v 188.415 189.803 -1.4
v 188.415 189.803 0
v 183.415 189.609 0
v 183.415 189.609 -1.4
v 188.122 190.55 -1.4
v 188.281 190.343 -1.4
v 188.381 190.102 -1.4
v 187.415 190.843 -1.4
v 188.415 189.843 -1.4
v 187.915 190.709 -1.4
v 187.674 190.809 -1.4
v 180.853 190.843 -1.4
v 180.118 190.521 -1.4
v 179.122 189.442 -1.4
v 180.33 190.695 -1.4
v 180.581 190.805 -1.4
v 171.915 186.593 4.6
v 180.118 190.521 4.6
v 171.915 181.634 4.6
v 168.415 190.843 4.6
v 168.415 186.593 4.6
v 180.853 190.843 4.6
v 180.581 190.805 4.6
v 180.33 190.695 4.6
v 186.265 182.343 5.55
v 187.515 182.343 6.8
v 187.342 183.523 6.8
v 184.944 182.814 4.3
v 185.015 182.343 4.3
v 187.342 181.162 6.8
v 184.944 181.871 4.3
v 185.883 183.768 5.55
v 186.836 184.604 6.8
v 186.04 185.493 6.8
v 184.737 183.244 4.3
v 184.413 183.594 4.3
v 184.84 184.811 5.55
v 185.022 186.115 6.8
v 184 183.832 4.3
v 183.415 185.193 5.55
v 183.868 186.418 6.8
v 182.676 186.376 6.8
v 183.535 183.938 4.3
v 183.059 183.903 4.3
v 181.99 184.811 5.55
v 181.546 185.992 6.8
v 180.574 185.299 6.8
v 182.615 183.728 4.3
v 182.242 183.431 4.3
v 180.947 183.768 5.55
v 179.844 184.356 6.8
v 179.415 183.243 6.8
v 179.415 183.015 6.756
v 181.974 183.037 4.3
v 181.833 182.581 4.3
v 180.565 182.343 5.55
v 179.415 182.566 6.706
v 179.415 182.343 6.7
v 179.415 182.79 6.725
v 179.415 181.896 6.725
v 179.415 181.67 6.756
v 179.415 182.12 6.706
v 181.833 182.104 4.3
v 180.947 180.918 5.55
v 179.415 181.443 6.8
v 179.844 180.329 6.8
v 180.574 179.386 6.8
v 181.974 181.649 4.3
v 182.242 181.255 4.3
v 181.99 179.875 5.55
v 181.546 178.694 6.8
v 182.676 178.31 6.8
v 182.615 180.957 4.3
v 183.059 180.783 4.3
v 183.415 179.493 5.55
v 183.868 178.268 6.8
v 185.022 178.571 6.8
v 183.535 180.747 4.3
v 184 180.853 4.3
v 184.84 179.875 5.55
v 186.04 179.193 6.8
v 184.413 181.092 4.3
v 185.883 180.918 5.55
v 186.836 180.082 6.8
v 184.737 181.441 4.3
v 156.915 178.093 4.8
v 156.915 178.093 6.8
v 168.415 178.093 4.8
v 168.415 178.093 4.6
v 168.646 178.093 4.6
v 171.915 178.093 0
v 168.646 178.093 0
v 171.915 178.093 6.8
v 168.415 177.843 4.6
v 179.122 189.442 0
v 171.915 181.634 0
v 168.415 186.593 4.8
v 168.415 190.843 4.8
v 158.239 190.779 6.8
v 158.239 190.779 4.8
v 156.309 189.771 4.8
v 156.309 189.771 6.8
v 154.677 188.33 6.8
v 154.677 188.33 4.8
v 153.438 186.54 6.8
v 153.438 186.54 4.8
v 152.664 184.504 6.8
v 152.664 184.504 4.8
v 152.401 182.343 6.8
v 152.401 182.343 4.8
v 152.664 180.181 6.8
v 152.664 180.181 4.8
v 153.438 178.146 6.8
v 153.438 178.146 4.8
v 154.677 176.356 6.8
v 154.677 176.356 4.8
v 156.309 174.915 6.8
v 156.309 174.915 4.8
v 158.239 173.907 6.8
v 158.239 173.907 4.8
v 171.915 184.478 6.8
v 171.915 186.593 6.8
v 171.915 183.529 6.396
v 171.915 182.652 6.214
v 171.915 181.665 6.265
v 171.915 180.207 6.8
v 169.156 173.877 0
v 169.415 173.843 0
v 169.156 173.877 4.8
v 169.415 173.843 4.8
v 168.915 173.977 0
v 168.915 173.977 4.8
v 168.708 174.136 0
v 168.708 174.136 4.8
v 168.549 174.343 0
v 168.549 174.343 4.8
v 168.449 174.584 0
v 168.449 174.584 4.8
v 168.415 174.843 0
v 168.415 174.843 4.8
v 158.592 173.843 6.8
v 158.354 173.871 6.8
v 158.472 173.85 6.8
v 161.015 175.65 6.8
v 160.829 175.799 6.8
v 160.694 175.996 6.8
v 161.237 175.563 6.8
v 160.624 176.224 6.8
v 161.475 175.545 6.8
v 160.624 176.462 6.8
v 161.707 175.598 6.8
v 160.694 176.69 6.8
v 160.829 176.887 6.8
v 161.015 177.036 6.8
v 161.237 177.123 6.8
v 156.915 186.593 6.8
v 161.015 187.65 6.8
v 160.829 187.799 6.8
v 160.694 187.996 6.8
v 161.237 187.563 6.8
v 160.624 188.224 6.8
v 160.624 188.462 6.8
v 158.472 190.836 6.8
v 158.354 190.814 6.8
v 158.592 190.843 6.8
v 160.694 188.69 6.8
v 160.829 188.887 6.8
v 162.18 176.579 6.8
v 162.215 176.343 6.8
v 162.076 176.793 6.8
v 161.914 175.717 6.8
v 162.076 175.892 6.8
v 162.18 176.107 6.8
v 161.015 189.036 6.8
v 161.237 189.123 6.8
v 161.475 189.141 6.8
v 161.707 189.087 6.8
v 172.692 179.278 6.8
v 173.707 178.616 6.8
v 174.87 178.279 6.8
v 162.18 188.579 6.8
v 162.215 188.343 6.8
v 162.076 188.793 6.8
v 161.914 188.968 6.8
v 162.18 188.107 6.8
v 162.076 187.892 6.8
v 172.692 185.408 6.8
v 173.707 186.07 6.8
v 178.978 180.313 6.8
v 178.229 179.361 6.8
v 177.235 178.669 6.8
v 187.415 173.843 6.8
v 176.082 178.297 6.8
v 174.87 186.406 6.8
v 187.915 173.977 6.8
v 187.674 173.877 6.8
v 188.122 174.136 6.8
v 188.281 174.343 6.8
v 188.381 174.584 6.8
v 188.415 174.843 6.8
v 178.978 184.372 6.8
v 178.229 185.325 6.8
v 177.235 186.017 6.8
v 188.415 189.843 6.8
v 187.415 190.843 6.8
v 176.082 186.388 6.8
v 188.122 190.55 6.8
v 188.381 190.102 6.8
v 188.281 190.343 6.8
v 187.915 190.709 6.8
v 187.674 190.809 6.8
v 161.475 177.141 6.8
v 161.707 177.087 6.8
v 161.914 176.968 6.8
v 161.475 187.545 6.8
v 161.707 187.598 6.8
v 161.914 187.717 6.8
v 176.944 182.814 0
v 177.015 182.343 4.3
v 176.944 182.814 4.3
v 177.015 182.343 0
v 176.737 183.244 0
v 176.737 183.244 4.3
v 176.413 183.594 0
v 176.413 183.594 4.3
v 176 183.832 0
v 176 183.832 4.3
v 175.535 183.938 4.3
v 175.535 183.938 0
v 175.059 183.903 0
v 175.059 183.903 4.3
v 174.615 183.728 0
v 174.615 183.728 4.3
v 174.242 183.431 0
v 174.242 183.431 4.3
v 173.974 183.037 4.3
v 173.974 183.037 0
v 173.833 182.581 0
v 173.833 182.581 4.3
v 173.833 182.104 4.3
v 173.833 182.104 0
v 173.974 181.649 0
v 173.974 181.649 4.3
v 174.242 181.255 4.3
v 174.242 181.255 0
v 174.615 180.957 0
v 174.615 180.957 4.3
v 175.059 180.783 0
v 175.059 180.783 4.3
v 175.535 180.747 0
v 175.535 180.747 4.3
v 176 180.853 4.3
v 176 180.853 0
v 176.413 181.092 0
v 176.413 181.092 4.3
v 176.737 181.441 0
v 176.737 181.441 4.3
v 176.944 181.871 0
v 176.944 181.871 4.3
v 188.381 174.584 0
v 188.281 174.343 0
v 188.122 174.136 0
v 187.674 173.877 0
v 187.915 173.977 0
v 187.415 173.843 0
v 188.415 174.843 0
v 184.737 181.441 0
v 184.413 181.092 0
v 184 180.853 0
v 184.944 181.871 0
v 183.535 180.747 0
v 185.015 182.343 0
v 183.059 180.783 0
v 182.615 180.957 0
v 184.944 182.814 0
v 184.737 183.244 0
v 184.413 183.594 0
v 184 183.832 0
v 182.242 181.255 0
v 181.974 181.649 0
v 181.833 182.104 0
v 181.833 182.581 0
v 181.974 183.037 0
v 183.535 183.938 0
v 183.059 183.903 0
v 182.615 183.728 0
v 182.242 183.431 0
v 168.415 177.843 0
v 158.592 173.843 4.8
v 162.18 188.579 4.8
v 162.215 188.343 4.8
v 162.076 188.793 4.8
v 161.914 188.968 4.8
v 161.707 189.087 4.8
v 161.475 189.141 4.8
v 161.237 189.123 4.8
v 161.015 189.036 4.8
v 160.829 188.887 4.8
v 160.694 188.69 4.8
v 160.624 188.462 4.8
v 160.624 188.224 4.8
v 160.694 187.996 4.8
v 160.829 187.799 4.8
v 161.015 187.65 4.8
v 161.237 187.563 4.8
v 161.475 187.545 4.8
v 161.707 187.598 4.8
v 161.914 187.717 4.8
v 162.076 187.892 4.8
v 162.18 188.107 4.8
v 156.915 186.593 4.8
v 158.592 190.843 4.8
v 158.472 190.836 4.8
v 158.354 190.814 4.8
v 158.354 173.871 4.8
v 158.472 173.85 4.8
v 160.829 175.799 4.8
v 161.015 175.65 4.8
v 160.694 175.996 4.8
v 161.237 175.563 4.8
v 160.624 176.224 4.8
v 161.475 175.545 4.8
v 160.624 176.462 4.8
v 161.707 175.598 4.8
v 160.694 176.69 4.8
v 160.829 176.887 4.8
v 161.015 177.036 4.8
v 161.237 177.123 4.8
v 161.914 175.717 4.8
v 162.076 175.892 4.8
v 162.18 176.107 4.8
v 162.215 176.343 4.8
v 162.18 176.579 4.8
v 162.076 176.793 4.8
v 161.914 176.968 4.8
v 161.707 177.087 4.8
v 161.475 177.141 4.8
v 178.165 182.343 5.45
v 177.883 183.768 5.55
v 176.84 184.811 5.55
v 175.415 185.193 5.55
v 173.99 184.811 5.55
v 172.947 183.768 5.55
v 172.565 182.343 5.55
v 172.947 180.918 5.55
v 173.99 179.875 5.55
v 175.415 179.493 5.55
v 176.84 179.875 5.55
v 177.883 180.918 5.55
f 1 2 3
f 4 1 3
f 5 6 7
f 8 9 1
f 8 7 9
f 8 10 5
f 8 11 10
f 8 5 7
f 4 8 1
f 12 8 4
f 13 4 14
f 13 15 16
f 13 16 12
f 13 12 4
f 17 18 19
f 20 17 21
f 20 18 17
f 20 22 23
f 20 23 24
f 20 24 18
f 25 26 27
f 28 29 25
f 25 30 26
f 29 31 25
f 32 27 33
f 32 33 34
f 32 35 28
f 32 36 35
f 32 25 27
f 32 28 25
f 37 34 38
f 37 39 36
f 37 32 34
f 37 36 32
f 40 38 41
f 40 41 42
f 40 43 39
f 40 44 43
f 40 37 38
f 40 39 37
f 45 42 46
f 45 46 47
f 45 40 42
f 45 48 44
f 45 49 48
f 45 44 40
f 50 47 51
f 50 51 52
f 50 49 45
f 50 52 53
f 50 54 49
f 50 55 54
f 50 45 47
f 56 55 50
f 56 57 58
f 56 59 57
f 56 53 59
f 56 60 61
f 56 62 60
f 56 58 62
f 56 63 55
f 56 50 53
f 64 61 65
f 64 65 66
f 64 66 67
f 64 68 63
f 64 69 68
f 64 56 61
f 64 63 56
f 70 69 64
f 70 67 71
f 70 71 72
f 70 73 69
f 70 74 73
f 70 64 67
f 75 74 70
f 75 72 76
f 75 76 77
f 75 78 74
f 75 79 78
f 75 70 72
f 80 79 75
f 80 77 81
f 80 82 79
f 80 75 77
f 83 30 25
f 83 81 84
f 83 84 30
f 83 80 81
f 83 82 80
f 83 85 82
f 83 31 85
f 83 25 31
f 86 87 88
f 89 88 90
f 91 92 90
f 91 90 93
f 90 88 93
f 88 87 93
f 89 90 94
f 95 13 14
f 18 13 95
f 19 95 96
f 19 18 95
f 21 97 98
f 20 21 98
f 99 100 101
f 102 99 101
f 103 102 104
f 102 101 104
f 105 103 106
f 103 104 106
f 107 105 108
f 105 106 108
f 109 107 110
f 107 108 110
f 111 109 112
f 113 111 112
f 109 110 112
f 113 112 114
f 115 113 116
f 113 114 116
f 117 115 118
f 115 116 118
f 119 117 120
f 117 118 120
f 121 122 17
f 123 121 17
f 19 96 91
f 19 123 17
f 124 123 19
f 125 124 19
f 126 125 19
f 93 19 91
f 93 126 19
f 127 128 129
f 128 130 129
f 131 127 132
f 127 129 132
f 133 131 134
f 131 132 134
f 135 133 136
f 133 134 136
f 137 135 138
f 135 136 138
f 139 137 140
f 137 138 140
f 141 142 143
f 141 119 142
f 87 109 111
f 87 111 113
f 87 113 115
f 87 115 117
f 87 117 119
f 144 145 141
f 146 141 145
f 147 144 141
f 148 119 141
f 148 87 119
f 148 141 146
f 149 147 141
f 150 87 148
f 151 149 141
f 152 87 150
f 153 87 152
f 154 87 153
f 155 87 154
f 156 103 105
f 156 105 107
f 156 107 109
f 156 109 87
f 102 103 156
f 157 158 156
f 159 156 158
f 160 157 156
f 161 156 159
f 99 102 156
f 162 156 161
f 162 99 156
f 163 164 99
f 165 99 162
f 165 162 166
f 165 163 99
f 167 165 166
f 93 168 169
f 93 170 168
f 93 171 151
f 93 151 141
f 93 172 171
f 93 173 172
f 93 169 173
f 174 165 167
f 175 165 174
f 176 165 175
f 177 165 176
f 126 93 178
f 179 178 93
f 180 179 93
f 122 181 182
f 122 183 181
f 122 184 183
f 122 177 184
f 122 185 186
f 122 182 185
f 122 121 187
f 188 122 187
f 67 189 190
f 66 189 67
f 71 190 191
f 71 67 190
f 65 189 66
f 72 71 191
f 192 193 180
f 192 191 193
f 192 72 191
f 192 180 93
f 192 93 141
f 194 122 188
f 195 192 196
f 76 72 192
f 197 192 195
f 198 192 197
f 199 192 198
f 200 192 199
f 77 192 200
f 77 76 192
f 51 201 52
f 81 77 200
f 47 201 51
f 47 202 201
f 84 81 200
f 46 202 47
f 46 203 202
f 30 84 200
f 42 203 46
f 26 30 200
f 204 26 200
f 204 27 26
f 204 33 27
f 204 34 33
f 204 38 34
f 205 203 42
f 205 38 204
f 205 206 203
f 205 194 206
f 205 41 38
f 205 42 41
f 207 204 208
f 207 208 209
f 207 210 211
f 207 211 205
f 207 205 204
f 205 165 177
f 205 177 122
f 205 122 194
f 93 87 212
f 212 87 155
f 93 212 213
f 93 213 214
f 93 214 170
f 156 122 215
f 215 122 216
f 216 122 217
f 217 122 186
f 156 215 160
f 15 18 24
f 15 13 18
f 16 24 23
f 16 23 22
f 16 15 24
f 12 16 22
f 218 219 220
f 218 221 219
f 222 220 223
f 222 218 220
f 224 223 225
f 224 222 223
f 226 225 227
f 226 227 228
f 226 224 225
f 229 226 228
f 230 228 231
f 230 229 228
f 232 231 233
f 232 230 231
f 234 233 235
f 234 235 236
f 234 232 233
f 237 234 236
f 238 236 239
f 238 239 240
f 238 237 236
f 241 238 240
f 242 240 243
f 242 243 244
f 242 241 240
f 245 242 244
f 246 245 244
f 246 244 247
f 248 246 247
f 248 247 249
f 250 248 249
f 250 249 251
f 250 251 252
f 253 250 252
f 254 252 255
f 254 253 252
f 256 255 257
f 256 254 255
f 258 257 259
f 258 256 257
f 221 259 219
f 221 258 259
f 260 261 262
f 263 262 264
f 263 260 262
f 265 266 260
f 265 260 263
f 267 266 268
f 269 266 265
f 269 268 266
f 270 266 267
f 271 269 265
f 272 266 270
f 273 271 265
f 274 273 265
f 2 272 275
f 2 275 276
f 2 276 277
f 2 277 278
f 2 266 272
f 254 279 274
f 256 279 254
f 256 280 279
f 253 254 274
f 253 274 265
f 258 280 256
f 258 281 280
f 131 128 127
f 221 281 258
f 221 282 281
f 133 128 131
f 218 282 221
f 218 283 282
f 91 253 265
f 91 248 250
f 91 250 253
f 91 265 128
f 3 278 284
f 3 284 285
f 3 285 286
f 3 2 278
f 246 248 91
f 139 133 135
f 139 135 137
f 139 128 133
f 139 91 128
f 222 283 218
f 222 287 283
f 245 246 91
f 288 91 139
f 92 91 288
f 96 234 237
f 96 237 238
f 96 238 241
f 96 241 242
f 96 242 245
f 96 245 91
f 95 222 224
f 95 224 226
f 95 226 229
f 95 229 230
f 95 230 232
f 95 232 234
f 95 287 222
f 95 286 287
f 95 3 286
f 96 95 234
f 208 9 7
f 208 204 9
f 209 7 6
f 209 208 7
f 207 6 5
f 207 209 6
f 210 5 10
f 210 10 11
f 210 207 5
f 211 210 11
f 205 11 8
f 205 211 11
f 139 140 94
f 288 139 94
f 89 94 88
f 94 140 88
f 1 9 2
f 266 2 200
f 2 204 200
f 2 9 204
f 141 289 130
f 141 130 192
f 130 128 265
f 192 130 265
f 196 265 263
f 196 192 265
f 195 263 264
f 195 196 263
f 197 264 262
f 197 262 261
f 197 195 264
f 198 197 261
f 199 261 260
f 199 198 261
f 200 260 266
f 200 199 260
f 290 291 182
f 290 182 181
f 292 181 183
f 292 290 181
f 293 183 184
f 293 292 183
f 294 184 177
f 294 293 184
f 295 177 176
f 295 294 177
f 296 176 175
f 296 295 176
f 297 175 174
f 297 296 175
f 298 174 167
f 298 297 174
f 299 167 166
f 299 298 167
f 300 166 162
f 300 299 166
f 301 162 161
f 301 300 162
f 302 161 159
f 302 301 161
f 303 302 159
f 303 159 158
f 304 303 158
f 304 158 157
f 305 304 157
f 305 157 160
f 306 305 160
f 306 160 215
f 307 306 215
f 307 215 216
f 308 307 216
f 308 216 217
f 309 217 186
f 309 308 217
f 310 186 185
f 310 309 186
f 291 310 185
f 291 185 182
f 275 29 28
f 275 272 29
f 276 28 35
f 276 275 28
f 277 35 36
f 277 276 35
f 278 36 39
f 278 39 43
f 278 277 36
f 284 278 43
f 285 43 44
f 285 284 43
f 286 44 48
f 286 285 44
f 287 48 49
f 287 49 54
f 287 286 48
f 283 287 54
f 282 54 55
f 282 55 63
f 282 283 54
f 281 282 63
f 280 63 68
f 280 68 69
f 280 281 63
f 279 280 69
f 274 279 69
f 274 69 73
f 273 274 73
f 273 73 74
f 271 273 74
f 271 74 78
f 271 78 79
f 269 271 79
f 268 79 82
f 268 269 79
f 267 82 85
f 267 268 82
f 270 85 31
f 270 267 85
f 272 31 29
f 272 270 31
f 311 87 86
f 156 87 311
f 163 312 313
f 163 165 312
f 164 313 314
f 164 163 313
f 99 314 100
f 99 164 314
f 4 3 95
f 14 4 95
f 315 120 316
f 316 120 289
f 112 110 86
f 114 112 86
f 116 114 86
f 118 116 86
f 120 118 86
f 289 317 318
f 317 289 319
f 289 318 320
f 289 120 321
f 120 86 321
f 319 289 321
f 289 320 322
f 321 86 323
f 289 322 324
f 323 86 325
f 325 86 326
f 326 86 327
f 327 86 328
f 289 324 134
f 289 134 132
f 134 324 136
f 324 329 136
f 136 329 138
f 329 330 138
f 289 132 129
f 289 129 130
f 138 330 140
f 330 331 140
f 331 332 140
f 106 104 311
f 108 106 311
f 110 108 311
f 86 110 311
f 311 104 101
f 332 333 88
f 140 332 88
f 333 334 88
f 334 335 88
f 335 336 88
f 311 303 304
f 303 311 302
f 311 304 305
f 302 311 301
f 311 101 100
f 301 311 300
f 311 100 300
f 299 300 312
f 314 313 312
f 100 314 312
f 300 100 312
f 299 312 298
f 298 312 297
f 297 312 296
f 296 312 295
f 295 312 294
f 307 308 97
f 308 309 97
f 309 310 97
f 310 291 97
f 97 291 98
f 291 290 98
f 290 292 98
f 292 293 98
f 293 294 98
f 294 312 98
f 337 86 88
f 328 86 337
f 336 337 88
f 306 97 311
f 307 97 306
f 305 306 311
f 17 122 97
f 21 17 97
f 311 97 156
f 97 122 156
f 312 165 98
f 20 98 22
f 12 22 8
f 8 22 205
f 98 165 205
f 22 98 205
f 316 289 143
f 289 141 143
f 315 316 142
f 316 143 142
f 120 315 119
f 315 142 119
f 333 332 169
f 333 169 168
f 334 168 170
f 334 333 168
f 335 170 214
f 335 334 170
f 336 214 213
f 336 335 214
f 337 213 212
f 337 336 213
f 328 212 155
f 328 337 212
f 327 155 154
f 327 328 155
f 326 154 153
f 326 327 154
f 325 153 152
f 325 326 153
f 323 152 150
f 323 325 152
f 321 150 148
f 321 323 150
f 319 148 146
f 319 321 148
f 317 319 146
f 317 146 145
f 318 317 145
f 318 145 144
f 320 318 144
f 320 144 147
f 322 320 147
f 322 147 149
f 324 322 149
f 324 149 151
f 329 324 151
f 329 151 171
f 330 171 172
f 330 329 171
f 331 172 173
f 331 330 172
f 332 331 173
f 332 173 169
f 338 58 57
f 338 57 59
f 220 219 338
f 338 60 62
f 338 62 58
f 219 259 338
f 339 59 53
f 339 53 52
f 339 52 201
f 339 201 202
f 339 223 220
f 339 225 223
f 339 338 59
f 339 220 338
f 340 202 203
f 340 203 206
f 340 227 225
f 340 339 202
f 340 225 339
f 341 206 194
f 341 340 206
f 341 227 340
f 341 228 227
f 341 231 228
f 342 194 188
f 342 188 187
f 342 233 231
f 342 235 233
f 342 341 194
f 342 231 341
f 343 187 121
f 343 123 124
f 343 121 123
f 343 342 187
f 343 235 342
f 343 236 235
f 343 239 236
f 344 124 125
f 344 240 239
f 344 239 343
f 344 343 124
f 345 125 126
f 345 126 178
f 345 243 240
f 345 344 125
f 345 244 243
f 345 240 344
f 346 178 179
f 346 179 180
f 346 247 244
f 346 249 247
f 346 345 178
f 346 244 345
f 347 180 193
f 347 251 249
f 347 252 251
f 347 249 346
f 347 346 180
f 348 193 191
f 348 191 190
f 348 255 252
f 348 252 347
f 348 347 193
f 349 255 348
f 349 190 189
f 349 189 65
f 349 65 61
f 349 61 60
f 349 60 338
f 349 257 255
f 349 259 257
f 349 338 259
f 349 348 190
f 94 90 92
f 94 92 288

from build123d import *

# Parameters (mm, degrees)
SKETCH4_R               = 1.6
BOSS_EXTRUDE1_DEPTH     = 4.8
SKETCH5_R               = 1.6
SKETCH5_R_2             = 0.8
BOSS_EXTRUDE3_DEPTH     = 2
BOSS_EXTRUDE4_DEPTH     = 1.4
CUT_EXTRUDE1_DEPTH      = 1.4
CUT_EXTRUDE1_DEPTH_BACK = 4.6
CHAMFER1_SIZE           = 2.5
FILLET1_R               = 1
CUT_EXTRUDE2_DEPTH      = 10


with BuildPart() as part:
    # Sketch4 → Boss-Extrude1 (new body)
    with BuildSketch(Plane.XY):
        Polygon((183.415148292, 173.842793615), (168.415148292, 173.842793615), (168.415148292, 190.842793615), (183.415148292, 190.842793615), (188.415148292, 190.842793615), (188.415148292, 173.842793615), align=None)
        with Locations((175.415148292, 182.342793615)):
            Circle(SKETCH4_R, mode=Mode.SUBTRACT)
        with Locations((183.415148292, 182.342793615)):
            Circle(SKETCH4_R, mode=Mode.SUBTRACT)
    extrude(amount=BOSS_EXTRUDE1_DEPTH)

    # Sketch5 → Boss-Extrude3 (add)
    with BuildSketch(Plane.XY.offset(4.8)):
        with BuildLine():
            ThreePointArc((158.415148292, 190.842793615), (152.401270103, 182.342793615), (158.415148292, 173.842793615))
            Line((158.415148292, 173.842793615), (188.415148292, 173.842793615))
            Line((188.415148292, 173.842793615), (188.415148292, 190.842793615))
            Line((188.415148292, 190.842793615), (158.415148292, 190.842793615))
        make_face()
        with Locations((175.415148292, 182.342793615)):
            Circle(SKETCH5_R, mode=Mode.SUBTRACT)
        with Locations((183.415148292, 182.342793615)):
            Circle(SKETCH5_R, mode=Mode.SUBTRACT)
        with Locations((161.415148292, 176.342793615)):
            Circle(SKETCH5_R_2, mode=Mode.SUBTRACT)
        with Locations((161.415148292, 188.342793615)):
            Circle(SKETCH5_R_2, mode=Mode.SUBTRACT)
    extrude(amount=BOSS_EXTRUDE3_DEPTH)

    # Sketch6 → Boss-Extrude4 (add)
    with BuildSketch(Plane(origin=(0, 0, 0), x_dir=(-1, 0, 0), z_dir=(0, 0, -1))):
        Polygon((-183.415148292, 189.608806881), (-168.415148292, 189.02555036), (-168.415148292, 190.842793615), (-183.415148292, 190.842793615), (-188.415148292, 190.842793615), (-188.415148292, 189.803225722), align=None)
    extrude(amount=BOSS_EXTRUDE4_DEPTH)

    # Sketch8 → Cut-Extrude1 (cut, two sides: drawn at the far end of the back side and taken through both)
    with BuildSketch(Plane(origin=(0, 0, 0), x_dir=(-1, 0, 0), z_dir=(0, 0, -1)).offset(-CUT_EXTRUDE1_DEPTH_BACK)):
        Polygon((-180.415148292, 190.842793615), (-168.415148292, 177.842793615), (-168.415148292, 190.842793615), align=None)
    extrude(amount=CUT_EXTRUDE1_DEPTH + CUT_EXTRUDE1_DEPTH_BACK, mode=Mode.SUBTRACT)

    # Chamfer1
    # the kernel refuses this chamfer: 2.5 mm, written as the material it takes off along each edge
    with BuildSketch(Plane(origin=(175.415148292, 182.342793615, 6.8), x_dir=(1, 0, 0), z_dir=(0, -1, 0))) as chamfer1_piece_1:
        Polygon((1.6 + CHAMFER1_SIZE, 0), (1.6, -CHAMFER1_SIZE), (1.6, 0), align=None)
    revolve(axis=Axis((175.415148292, 182.342793615, 6.8), (0, 0, 1)), mode=Mode.SUBTRACT)
    with BuildSketch(Plane(origin=(183.415148292, 182.342793615, 6.8), x_dir=(1, 0, 0), z_dir=(0, -1, 0))) as chamfer1_piece_2:
        Polygon((1.6 + CHAMFER1_SIZE, 0), (1.6, -CHAMFER1_SIZE), (1.6, 0), align=None)
    revolve(axis=Axis((183.415148292, 182.342793615, 6.8), (0, 0, 1)), mode=Mode.SUBTRACT)

    # Fillet1
    fillet1_edges = [part.edges().sort_by_distance(p)[0] for p in [
        (168.415148292, 173.842793615, 2.4),
        (188.415148292, 190.842793615, 2.7),
        (188.415148292, 173.842793615, 3.4),
        (158.415148292, 190.842793615, 5.8),
        (158.415148292, 173.842793615, 5.8),
        (180.415148292, 190.842793615, 1.6),
    ]]
    fillet(fillet1_edges, radius=FILLET1_R)

    # Sketch9 → Cut-Extrude2 (cut)
    with BuildSketch(Plane.XY.offset(6.8)):
        Polygon((165.915148292, 186.592793615), (171.915148292, 186.592793615), (171.915148292, 178.092793615), (165.915148292, 178.092793615), (156.915148292, 178.092793615), (156.915148292, 186.592793615), align=None)
    extrude(amount=-CUT_EXTRUDE2_DEPTH, mode=Mode.SUBTRACT)


solid = part.part
